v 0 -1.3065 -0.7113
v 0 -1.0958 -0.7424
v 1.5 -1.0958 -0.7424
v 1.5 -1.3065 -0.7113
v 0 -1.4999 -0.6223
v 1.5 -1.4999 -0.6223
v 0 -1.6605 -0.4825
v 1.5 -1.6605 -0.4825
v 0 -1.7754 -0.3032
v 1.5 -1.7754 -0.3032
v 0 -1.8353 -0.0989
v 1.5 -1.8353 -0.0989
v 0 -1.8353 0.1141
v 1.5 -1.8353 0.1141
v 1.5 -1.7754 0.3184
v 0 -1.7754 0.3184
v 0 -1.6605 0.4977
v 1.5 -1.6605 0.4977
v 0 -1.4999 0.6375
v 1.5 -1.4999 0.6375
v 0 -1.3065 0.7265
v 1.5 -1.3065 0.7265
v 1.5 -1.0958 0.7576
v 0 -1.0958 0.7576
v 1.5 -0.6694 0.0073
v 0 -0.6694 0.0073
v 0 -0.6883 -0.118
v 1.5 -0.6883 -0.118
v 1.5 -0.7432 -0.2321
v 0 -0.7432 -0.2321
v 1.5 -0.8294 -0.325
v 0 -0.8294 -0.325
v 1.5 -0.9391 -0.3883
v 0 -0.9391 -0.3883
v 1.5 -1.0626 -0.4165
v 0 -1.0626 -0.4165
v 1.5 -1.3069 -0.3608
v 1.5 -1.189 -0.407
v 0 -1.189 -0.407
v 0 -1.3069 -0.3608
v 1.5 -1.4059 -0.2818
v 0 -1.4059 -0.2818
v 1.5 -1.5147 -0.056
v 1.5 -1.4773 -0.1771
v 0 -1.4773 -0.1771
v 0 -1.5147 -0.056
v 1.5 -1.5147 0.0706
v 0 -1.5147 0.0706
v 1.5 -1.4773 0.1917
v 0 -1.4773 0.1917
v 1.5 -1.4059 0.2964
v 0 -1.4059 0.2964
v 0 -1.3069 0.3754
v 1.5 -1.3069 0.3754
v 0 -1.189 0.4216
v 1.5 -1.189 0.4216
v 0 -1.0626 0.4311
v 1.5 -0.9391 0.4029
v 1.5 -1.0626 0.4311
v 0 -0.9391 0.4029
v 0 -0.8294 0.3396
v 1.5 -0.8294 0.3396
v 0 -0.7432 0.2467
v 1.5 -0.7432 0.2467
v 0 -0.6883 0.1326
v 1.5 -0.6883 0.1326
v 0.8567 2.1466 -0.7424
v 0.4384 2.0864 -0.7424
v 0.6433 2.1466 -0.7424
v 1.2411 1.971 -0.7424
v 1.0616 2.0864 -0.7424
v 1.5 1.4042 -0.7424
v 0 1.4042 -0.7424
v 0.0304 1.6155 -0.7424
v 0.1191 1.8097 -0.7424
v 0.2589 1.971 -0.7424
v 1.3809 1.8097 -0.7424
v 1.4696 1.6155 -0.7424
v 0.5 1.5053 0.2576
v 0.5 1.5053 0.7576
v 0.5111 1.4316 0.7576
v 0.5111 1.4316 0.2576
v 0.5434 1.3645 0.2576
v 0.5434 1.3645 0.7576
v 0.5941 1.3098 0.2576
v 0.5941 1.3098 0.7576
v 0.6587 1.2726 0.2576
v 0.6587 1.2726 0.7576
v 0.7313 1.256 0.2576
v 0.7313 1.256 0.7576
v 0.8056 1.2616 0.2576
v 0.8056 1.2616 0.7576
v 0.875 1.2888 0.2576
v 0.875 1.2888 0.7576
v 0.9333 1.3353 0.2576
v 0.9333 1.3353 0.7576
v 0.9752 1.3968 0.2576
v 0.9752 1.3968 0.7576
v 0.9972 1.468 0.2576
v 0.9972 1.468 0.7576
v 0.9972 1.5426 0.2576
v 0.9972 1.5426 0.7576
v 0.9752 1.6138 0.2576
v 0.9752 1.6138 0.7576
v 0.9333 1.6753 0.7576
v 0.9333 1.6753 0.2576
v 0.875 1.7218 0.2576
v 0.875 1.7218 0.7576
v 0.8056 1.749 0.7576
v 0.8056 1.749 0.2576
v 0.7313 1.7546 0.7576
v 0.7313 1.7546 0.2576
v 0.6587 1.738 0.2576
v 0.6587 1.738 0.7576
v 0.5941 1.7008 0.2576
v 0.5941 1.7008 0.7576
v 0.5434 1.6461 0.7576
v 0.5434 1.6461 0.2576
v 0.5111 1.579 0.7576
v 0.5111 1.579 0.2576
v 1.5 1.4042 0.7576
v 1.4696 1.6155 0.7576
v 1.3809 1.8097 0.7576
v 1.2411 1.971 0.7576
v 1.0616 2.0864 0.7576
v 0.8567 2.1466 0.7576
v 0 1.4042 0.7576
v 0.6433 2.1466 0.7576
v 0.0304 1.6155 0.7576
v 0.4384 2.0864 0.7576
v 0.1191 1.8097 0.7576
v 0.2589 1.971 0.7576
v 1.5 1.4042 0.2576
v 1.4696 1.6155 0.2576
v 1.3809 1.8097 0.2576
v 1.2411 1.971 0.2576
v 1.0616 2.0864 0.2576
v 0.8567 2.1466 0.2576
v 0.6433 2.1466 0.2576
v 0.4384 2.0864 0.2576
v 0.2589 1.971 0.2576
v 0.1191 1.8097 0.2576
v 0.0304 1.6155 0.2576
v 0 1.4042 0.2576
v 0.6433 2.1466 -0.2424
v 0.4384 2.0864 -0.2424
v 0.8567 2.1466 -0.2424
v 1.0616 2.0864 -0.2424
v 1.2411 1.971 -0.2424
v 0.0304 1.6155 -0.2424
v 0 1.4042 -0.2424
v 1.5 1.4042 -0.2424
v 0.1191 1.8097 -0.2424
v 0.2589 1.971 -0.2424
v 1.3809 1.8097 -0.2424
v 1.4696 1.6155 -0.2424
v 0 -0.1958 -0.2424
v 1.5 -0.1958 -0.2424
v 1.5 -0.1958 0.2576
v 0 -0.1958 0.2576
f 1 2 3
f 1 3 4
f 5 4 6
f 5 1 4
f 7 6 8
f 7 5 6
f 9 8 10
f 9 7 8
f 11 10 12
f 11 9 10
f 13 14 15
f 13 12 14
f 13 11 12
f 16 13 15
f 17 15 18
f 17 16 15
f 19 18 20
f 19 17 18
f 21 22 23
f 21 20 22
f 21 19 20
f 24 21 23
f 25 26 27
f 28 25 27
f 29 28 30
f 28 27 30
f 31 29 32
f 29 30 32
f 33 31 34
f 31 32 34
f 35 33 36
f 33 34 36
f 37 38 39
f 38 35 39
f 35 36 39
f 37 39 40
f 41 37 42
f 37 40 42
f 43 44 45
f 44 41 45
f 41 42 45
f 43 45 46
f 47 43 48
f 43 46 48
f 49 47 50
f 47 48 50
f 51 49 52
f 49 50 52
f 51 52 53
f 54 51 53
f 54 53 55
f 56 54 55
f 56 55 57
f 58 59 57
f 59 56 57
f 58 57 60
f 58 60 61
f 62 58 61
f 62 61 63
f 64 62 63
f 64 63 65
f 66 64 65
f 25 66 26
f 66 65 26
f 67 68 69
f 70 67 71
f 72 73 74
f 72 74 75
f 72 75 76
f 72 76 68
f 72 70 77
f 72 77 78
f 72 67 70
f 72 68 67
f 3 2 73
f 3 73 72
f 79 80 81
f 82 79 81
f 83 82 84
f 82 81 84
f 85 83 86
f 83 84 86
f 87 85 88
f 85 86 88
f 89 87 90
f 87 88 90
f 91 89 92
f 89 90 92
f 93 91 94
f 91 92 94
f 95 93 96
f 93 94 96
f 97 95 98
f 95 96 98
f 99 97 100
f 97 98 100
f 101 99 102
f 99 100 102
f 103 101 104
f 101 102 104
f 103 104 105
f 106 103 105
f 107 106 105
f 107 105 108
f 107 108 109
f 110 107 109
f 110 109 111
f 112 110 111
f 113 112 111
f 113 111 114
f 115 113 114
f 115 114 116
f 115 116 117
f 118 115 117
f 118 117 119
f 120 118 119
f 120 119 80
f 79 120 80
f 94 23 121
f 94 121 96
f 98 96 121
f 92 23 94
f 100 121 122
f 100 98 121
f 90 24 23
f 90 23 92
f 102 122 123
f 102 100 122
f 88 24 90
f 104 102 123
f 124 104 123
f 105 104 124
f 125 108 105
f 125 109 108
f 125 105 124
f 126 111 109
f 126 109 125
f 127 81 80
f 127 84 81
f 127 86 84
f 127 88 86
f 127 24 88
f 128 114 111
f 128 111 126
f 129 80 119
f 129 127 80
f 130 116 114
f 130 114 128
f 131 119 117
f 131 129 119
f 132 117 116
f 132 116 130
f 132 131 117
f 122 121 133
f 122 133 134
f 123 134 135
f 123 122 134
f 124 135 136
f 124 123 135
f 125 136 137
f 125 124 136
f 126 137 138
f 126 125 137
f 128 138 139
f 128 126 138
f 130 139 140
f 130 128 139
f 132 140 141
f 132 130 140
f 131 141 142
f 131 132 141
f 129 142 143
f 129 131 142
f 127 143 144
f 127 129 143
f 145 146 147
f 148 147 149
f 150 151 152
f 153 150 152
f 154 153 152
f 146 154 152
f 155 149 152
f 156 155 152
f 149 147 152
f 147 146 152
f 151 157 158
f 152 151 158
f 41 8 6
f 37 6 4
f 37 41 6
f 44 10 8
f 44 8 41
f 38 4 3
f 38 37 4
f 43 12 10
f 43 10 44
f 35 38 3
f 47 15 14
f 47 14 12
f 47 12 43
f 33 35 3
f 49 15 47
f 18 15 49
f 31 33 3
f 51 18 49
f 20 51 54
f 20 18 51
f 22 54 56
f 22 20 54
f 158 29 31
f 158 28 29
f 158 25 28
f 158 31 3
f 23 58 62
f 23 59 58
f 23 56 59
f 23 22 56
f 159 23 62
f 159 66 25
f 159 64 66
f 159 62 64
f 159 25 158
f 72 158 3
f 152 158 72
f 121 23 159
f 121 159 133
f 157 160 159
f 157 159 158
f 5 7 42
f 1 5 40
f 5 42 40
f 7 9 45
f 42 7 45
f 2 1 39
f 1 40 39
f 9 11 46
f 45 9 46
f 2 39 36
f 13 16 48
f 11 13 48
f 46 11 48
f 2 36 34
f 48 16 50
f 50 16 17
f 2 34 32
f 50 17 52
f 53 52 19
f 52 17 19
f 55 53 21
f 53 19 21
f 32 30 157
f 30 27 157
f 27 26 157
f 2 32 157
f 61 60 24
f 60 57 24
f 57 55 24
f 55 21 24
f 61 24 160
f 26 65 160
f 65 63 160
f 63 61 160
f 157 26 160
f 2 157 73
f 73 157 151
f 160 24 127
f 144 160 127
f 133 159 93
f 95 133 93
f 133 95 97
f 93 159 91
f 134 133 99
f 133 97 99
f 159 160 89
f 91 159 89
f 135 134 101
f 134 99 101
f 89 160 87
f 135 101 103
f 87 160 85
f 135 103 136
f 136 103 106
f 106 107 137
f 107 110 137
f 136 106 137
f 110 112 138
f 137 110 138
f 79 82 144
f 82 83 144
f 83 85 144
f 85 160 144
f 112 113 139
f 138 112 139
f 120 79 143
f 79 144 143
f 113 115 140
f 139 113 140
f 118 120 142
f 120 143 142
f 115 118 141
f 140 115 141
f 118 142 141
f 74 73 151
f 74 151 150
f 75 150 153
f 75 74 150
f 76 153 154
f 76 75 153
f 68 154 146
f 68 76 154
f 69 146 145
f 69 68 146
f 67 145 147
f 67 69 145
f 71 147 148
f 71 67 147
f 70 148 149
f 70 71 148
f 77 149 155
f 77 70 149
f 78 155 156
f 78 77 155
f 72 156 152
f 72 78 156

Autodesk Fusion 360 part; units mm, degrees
sketch "Sketch1" plane through (0, 0, 0) normal (1, 0, 0) x (0, 1, 0) in component "Component"
  circle A0 centre (-1.0944, 0.0073) radius 0.425
  line L0 (2.1063, -0.2468) -> (2.1063, -0.2424)
  line L1 (1.4084, 0.2576) -> (1.4122, 0.2576)
  line L2 (2.1063, -0.2424) -> (2.113, -0.2424)
  line L3 (-1.0958, -0.7424) -> (1.4042, -0.7424)
  line L4 (-0.1958, 0.2576) -> (1.4042, 0.2576)
  line L5 (-0.1958, 0.2576) -> (-0.1958, -0.2424)
  line L6 (-0.1958, -0.2424) -> (1.4042, -0.2424)
  line L7 (1.4042, -0.2424) -> (1.4042, -0.7424)
  line L8 (-1.0958, 0.7576) -> (1.4042, 0.7576)
  line L9 (1.4042, 0.7576) -> (1.4042, 0.2576)
  line L10 (-1.0958, 0.7576) -> (-1.0958, 0.7558)
  line L11 (-1.0958, -0.7411) -> (-1.0958, -0.7424)
  arc A1 (-1.0958, 0.7558) -> (-1.0958, -0.7411) centre (-1.0944, 0.0073) ccw
  line L12 (-2.5, -2.5) -> (0, -2.5)
  line L13 (-2.5, -2.5) -> (-2.5, -4)
  line L14 (0, -4) -> (-2.5, -4)
  circle A2 centre (0, -3.25) radius 0.25
  circle A3 centre (0, -3.25) radius 0.75
  circle A4 centre (0, -3.25) radius 0.75
  line L15 (-2.5, -2.5) -> (-2.5, -4)
  point P0 (1.4042, 0.7576)
  point P1 (-1.0958, 0.7576)
  dimension "d17" = 0.85
  dimension "d33" = 0.5
  dimension "d35" = 1.6
  dimension "d36" = 0.5
  dimension "d37" = 2.5
  dimension "d38" = 2.5
  dimension "d39" = 1.5
  dimension "d40" = 0.5
  dimension "d41" = 1.5
extrude "Extrude1" add sketch "Sketch1" along normal blind 1.5 contours L3 L4 L5 L6 L7 L8 L9 A1 in component "Component"
sketch "Sketch2" plane through (0, 0, 0.7576) normal (0, 0, 1) x (-1, 0, 0) in component "Component"
  line L0 (0, -1.4042) -> (0, 1.0958)
  line L1 (0, 1.0958) -> (-1.5, 1.0958)
  line L2 (-1.5, 1.0958) -> (-1.5, -1.4042)
  line L3 (-1.5, -1.4042) -> (0, -1.4042)
  circle A0 centre (-0.75, -1.4042) radius 0.25
  arc A1 (-1.5, -1.4042) -> (0, -1.4042) centre (-0.75, -1.4042) ccw
  dimension "d44" = 0.5
extrude "Extrude2" add sketch "Sketch2" against normal blind 0.5 contours L3 A0 A1 | L3 A0 | L3 A0 in component "Component"
sketch "Sketch3" plane through (0, 0, 0.7576) normal (0, 0, 1) x (-1, 0, 0) in component "Component"
  line L0 (0, -1.4042) -> (0, 1.0958)
  line L1 (0, 1.0958) -> (-1.5, 1.0958)
  line L2 (-1.5, 1.0958) -> (-1.5, -1.4042)
  arc A0 (-1.5, -1.4042) -> (0, -1.4042) centre (-0.75, -1.4042) ccw
  circle A1 centre (-0.75, -1.5053) radius 0.25
  dimension "d47" = 0.5
extrude "Extrude3" cut sketch "Sketch3" against normal blind 0.5 contours A1 in component "Component"
sketch "Sketch4" plane through (0, 0, -0.7424) normal (0, 0, -1) x (1, 0, 0) in component "Component"
  line L0 (0, 1.0958) -> (0, -1.4042)
  line L1 (0, -1.4042) -> (1.5, -1.4042)
  line L2 (1.5, -1.4042) -> (1.5, 1.0958)
  line L3 (1.5, 1.0958) -> (0, 1.0958)
  circle A0 centre (0.75, -1.4042) radius 0.75
  dimension "d50" = 1.5
extrude "Extrude4" add sketch "Sketch4" against normal blind 0.5 contours L1 A0 picked at (1, -1.8916) in component "Component"
component "Component" placed x (1, 0, 0) y (0, 1, 0) z (0, 0, 1) at (0, 0, 0)
